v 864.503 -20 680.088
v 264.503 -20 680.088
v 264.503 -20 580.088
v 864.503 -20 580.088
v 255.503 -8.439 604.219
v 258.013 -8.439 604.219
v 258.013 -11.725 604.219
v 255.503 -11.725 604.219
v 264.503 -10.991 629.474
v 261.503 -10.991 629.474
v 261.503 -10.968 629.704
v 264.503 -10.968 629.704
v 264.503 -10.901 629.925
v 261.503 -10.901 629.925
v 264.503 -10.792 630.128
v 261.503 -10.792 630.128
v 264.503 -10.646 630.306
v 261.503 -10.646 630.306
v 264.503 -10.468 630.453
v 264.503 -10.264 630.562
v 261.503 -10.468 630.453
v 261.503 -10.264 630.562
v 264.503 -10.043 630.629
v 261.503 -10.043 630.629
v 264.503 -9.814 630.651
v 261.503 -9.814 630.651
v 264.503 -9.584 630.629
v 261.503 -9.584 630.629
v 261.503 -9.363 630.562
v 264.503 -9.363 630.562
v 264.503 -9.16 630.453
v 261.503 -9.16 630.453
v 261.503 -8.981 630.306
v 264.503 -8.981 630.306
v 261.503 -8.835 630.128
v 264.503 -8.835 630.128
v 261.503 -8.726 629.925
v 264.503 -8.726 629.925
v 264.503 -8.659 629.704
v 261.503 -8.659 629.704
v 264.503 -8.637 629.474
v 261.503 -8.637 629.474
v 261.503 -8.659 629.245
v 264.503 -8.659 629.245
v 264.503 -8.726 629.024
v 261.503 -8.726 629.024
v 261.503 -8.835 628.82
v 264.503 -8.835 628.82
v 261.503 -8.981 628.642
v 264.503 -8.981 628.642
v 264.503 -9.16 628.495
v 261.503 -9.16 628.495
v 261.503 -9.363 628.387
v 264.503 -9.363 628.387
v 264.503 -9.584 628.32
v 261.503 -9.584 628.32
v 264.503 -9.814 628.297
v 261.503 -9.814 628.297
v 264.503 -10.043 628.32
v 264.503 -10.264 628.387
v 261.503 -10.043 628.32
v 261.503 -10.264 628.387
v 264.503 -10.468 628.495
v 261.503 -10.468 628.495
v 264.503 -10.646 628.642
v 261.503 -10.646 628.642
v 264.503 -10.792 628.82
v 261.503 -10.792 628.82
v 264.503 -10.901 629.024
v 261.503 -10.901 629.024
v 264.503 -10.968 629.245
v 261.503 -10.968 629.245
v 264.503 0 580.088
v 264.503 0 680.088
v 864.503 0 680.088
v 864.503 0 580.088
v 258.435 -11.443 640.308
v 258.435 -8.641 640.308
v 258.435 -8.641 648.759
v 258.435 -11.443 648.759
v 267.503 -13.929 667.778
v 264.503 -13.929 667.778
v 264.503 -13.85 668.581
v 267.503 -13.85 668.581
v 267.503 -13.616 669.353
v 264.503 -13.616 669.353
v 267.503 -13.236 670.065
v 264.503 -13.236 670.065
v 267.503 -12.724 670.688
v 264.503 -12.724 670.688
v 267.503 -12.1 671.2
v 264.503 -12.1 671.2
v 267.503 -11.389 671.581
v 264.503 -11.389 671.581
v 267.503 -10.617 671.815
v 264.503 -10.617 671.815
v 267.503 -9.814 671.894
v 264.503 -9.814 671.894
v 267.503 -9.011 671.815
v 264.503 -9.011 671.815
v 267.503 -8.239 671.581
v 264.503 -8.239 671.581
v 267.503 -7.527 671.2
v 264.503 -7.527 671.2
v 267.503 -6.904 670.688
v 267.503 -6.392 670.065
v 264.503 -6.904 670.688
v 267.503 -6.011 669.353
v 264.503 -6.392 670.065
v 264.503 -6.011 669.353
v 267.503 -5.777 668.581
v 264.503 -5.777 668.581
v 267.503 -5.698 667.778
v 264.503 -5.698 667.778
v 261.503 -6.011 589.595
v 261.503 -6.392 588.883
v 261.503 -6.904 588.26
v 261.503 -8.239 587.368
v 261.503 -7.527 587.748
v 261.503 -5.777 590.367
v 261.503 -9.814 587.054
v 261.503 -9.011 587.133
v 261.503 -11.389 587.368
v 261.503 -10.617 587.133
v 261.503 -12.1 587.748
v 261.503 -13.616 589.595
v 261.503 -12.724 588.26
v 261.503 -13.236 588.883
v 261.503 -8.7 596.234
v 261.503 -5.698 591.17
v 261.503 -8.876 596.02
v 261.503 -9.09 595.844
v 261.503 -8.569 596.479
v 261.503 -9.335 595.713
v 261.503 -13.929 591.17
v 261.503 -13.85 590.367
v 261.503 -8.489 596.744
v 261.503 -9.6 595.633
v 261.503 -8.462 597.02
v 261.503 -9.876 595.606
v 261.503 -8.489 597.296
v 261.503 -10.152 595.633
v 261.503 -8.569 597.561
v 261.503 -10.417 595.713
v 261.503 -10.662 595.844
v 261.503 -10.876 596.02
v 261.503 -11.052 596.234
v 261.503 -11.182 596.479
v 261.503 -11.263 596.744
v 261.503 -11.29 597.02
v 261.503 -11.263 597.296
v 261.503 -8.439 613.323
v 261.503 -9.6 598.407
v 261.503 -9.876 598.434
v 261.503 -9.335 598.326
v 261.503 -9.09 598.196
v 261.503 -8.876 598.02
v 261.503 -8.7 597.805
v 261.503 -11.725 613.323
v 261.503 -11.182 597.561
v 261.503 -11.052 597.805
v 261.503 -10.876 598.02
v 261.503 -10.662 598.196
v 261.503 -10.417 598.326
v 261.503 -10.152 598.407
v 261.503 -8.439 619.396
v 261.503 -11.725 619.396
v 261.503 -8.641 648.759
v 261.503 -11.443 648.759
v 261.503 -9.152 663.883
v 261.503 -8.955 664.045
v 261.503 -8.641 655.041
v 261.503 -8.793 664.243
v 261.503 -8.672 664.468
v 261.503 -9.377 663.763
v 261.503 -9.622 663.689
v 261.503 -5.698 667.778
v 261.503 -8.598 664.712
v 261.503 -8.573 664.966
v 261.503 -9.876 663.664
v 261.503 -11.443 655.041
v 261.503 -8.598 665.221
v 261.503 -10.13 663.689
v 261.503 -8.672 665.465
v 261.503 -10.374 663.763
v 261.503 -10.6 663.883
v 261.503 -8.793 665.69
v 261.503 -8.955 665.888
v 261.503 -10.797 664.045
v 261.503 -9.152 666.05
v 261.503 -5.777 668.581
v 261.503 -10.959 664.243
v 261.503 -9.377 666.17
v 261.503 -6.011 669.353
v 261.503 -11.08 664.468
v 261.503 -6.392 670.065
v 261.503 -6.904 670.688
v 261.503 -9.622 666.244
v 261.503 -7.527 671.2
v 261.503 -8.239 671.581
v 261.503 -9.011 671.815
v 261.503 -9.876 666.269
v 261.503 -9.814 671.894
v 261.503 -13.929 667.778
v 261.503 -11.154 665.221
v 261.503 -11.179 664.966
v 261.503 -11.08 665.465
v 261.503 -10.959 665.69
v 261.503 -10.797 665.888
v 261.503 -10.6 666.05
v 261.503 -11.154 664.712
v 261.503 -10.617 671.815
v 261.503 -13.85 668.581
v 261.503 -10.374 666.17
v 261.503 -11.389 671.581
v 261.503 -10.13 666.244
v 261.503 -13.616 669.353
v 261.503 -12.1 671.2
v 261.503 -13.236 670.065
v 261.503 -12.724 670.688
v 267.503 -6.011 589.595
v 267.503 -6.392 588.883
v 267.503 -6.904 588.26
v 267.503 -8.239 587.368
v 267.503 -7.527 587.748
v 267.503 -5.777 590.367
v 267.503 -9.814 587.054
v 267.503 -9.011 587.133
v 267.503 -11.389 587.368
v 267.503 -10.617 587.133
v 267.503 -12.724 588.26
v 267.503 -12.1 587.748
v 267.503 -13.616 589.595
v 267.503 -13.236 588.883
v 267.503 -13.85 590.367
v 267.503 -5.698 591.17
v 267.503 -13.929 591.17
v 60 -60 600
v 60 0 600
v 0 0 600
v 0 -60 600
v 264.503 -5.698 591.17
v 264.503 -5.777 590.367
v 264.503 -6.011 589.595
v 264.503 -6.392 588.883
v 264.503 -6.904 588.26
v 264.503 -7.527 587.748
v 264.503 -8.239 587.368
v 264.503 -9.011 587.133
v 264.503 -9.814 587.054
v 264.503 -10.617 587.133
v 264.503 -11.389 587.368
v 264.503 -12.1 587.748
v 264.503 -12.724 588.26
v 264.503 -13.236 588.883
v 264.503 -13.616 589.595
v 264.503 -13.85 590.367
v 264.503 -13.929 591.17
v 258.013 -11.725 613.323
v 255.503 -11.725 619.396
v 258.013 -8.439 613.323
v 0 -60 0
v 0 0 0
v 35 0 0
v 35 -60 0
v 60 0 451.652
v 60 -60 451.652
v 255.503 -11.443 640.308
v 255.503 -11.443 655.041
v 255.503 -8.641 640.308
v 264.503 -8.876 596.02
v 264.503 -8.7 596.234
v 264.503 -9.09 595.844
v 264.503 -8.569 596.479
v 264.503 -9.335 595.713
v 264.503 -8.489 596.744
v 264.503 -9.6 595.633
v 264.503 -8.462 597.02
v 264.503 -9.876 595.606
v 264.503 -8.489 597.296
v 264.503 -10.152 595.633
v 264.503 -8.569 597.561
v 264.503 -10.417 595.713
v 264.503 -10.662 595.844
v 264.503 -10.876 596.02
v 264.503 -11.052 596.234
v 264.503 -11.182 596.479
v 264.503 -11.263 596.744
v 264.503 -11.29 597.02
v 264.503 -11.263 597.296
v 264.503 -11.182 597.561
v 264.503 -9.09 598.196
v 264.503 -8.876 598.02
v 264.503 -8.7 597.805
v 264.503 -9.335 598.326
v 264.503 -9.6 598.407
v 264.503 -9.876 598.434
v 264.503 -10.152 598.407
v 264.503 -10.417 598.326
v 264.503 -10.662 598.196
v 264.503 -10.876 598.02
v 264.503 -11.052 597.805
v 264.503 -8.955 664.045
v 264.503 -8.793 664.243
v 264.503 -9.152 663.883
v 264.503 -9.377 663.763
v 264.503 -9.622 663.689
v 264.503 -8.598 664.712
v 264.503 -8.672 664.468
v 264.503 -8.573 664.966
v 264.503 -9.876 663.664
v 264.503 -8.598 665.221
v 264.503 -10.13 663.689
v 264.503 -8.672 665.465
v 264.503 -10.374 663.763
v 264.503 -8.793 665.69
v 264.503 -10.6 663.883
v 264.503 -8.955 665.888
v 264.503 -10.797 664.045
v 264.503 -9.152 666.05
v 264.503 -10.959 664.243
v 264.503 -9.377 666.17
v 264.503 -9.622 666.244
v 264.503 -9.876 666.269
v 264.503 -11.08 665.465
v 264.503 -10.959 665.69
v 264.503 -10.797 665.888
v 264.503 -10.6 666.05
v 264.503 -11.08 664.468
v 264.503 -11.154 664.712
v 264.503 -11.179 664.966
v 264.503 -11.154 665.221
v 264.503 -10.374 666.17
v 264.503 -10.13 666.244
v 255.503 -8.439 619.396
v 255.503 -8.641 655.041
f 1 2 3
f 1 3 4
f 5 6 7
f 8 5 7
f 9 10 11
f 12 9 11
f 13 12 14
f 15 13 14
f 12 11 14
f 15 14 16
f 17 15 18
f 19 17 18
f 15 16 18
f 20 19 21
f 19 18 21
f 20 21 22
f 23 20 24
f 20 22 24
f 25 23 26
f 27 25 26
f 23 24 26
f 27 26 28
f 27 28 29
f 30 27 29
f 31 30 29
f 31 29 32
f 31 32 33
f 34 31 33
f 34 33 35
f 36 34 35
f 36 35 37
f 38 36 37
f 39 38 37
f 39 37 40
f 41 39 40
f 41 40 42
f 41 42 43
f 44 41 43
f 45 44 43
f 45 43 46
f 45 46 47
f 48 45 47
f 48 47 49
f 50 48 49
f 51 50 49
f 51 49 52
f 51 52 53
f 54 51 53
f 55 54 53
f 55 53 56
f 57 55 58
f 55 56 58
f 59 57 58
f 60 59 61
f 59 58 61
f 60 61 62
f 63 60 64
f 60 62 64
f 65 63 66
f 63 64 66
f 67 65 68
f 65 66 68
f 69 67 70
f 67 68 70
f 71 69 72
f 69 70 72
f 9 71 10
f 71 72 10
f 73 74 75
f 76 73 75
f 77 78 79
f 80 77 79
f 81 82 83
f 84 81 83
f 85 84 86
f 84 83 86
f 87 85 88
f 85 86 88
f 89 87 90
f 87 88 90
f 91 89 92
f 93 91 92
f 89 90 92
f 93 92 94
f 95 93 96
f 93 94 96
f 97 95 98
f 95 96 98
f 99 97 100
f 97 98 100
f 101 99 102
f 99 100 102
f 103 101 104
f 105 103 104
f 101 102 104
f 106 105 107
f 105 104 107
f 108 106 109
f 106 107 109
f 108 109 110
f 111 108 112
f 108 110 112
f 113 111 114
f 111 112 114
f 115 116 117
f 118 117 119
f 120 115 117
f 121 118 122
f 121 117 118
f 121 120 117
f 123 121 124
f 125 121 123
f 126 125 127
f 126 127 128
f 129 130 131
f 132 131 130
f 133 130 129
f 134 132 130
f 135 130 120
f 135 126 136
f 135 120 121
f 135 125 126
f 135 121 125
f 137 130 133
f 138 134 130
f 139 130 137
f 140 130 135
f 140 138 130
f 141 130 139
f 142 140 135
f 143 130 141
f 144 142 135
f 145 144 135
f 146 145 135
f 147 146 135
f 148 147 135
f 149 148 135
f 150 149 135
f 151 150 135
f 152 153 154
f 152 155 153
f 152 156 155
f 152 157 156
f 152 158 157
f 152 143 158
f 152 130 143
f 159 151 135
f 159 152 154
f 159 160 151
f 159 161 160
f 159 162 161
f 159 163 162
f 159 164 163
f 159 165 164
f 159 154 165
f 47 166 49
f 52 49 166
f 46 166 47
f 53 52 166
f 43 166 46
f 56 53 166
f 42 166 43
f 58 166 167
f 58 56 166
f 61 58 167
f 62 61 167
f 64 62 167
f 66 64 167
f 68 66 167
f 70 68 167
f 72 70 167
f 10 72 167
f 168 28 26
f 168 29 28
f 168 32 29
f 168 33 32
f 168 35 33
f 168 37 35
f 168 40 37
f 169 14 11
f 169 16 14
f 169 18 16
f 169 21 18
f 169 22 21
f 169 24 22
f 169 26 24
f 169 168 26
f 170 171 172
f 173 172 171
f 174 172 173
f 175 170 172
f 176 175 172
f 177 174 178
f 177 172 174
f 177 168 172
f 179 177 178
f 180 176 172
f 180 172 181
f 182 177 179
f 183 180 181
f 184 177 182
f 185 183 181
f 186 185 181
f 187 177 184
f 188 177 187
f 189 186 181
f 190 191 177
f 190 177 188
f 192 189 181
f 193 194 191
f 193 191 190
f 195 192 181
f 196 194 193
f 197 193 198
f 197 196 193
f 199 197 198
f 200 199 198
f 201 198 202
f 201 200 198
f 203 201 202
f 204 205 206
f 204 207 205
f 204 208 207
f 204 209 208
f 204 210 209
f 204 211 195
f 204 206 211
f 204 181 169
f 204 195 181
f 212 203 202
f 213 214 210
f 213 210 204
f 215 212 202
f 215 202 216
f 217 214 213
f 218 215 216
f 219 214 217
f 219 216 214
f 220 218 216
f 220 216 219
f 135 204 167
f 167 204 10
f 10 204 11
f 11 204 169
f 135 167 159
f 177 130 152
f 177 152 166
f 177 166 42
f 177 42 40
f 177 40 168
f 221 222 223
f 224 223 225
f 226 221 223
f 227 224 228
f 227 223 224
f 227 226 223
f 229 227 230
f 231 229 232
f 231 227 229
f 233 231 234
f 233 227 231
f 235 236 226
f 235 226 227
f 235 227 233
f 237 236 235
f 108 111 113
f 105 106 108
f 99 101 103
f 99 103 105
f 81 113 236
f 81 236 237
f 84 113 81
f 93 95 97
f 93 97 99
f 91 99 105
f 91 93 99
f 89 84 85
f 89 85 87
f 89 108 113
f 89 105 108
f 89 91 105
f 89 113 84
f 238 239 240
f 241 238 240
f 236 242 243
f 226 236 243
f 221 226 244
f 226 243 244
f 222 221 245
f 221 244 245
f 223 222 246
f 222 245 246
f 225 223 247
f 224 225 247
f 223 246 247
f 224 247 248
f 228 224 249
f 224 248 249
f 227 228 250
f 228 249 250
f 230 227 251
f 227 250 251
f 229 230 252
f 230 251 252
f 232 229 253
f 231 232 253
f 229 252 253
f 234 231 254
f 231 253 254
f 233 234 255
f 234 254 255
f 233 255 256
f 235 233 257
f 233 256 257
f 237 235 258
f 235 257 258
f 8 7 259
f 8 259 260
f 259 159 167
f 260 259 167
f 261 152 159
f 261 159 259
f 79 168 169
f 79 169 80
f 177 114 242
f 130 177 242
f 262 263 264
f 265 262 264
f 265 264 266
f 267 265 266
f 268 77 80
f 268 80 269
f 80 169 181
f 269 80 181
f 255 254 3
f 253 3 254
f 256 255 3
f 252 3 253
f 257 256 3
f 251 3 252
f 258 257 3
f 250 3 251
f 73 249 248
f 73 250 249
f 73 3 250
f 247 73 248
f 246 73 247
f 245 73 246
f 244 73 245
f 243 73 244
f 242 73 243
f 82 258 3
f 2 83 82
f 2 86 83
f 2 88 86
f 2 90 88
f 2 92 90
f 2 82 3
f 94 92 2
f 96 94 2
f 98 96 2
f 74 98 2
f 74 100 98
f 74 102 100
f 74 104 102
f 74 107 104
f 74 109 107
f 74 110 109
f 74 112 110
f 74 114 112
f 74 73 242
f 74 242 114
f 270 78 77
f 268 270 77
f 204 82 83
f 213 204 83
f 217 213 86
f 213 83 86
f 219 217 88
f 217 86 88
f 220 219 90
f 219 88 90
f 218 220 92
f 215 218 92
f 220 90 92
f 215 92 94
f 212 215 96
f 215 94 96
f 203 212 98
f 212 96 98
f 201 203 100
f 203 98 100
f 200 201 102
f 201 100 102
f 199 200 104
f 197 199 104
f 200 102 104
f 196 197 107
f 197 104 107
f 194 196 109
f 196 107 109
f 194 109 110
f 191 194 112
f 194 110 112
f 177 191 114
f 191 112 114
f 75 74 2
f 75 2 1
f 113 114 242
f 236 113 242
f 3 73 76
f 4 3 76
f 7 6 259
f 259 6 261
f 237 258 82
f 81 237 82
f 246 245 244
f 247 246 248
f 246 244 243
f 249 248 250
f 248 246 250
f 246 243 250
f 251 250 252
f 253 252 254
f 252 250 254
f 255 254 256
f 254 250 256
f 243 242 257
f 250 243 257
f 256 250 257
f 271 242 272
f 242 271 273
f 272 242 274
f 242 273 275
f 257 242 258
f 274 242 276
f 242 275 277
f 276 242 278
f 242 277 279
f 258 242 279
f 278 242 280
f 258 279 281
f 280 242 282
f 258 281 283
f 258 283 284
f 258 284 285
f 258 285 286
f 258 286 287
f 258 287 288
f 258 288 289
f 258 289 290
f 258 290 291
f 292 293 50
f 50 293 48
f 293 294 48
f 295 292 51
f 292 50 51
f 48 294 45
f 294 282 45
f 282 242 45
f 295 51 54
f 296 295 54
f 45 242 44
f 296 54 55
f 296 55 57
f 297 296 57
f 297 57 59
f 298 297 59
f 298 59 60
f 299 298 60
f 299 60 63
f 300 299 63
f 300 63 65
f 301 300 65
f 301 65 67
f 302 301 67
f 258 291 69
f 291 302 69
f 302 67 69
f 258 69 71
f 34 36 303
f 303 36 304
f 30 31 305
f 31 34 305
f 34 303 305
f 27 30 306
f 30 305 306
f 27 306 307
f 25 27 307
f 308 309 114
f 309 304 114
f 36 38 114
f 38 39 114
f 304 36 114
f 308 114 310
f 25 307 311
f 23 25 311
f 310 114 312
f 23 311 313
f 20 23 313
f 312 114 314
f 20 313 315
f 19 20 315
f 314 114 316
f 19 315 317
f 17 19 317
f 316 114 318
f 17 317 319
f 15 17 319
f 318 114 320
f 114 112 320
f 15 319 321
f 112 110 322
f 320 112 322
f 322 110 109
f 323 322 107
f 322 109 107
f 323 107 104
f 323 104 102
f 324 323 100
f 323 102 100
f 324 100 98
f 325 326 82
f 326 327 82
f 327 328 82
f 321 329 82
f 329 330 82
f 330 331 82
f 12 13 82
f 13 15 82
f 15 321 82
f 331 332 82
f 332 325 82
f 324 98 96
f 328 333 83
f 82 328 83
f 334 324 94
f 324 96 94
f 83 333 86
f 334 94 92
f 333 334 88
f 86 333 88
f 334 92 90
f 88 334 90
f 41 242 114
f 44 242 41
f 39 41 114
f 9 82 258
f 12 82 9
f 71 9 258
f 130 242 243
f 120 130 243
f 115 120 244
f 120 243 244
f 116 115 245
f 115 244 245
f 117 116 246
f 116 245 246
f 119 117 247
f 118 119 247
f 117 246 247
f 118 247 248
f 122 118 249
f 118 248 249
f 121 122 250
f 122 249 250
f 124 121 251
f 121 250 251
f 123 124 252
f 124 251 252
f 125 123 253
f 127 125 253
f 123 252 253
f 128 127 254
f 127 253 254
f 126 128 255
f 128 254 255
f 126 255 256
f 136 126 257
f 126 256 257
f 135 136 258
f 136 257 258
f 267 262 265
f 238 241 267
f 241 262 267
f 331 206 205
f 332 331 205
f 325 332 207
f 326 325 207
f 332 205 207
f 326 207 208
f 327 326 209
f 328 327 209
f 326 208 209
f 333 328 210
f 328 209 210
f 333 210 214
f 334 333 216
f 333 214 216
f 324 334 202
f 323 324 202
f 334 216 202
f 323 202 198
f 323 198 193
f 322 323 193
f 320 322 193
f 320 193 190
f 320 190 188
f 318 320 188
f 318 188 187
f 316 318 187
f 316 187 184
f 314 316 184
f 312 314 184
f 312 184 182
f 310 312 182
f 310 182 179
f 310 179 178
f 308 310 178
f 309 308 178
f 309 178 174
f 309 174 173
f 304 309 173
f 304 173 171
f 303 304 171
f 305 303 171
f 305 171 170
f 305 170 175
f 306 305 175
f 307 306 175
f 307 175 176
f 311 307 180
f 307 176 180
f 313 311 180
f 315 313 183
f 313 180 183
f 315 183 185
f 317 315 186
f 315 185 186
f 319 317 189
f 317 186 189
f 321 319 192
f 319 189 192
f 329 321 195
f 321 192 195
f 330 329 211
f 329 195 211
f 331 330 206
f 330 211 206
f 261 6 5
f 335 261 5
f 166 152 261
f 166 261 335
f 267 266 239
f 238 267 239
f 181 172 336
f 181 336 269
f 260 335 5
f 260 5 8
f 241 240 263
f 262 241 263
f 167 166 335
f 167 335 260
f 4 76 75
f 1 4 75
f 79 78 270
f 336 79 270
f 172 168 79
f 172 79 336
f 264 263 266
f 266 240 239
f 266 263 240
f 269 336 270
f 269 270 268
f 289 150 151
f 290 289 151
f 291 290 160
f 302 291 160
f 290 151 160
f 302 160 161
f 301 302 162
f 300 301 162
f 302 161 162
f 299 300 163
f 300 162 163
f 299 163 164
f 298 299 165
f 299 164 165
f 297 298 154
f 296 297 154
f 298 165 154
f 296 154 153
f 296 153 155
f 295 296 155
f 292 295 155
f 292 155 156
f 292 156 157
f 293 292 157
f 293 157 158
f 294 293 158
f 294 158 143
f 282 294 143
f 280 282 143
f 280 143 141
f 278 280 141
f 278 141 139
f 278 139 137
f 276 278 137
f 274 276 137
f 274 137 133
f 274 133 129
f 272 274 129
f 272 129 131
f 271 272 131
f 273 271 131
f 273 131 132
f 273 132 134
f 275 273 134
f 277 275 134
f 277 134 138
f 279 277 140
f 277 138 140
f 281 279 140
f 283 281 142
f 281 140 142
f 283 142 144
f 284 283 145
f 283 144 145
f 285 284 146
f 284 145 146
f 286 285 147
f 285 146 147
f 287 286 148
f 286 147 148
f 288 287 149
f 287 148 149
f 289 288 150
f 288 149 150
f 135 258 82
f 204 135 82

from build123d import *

# Parameters (mm, degrees)
F1_DEPTH  = 60
F3_W      = 600
F3_H      = 100
F4_DEPTH  = 20
F6_DEPTH  = 3
F7_DEPTH  = 3
F8_R      = 1.4141506132
F8_R_2    = 1.3029129936
F8_R_3    = 1.1770229145
F9_DEPTH  = 15
F10_W     = 2.8019864112
F10_H     = 14.732837677
F11_DEPTH = 6
F10_W_2   = 3.2857935876
F10_H_2   = 15.1772499084
F12_DEPTH = 6
F13_W     = 3.067890475
F13_H     = 8.4506869316
F14_DEPTH = 25.4
F15_W     = 3.4896529414
F15_H     = 9.1037750244
F16_DEPTH = 25.4


with BuildPart() as f1:
    # F0 (on Front) → F1 (new body)
    with BuildSketch(Plane.XZ):
        Polygon((0, 600), (0, 0), (35, 0), (60, 451.6516281811), (60, 600), align=None)
    extrude(amount=F1_DEPTH)


with BuildPart() as f4:
    # F3 (on face) → F4 (new body)
    with BuildSketch(Plane.XZ):
        with Locations((564.5029609896, 630.087941885)):
            Rectangle(F3_W, F3_H)
    extrude(amount=F4_DEPTH)

    # F5 (on face) → F6 (cut)
    with BuildSketch(Plane(origin=(264.5029609896, 0, 0), x_dir=(0, -1, 0), z_dir=(-1, 0, 0))):
        with BuildLine():
            ThreePointArc((13.9291705564, 667.7783727646), (9.8136605229, 671.893882798), (5.6981504895, 667.7783727646))
            Line((5.6981504895, 667.7783727646), (5.6981504895, 591.1698937416))
            ThreePointArc((5.6981504895, 591.1698937416), (9.8136605229, 587.0543837082), (13.9291705564, 591.1698937416))
            Line((13.9291705564, 591.1698937416), (13.9291705564, 667.7783727646))
        make_face()
    extrude(amount=-F6_DEPTH, mode=Mode.SUBTRACT)


with BuildPart() as f7:
    # F5 (on face) → F7 (new body)
    with BuildSketch(Plane(origin=(264.5029609896, 0, 0), x_dir=(0, -1, 0), z_dir=(-1, 0, 0))):
        with BuildLine():
            ThreePointArc((13.9291705564, 667.7783727646), (9.8136605229, 671.893882798), (5.6981504895, 667.7783727646))
            Line((5.6981504895, 667.7783727646), (5.6981504895, 591.1698937416))
            ThreePointArc((5.6981504895, 591.1698937416), (9.8136605229, 587.0543837082), (13.9291705564, 591.1698937416))
            Line((13.9291705564, 591.1698937416), (13.9291705564, 667.7783727646))
        make_face()
    extrude(amount=F7_DEPTH)

    # F8 (on face) → F9 (cut)
    with BuildSketch(Plane(origin=(261.5029609896, 0, 0), x_dir=(0, -1, 0), z_dir=(-1, 0, 0))):
        with Locations((9.8758814856, 597.0197916031)):
            Circle(F8_R)
        with Locations((9.8758814856, 664.9664640427)):
            Circle(F8_R_2)
        with Locations((9.8136605229, 629.4741332531)):
            Circle(F8_R_3)
    extrude(amount=-F9_DEPTH, mode=Mode.SUBTRACT)

    # F10 (on face) → F11 (join)
    with BuildSketch(Plane(origin=(261.5029609896, 0, 0), x_dir=(0, -1, 0), z_dir=(-1, 0, 0))):
        with Locations((10.0416680798, 647.6745605469)):
            Rectangle(F10_W, F10_H)
    extrude(amount=F11_DEPTH)

    # F10 (on face) → F12 (join)
    with BuildSketch(Plane(origin=(261.5029609896, 0, 0), x_dir=(0, -1, 0), z_dir=(-1, 0, 0))):
        with Locations((10.0818593055, 611.8075251579)):
            Rectangle(F10_W_2, F10_H_2)
    extrude(amount=F12_DEPTH)

    # F13 (on face) → F14 (cut)
    with BuildSketch(Plane(origin=(0, -8.6406748742, 0), x_dir=(-1, 0, 0), z_dir=(0, 1, 0))):
        with Locations((-259.9690157522, 644.5334851742)):
            Rectangle(F13_W, F13_H)
    extrude(amount=-F14_DEPTH, mode=Mode.SUBTRACT)

    # F15 (on face) → F16 (cut)
    with BuildSketch(Plane(origin=(0, -8.4389625117, 0), x_dir=(-1, 0, 0), z_dir=(0, 1, 0))):
        with Locations((-259.7581345189, 608.7707877159)):
            Rectangle(F15_W, F15_H)
    extrude(amount=-F16_DEPTH, mode=Mode.SUBTRACT)


solid = Compound([f1.part, f4.part, f7.part])
